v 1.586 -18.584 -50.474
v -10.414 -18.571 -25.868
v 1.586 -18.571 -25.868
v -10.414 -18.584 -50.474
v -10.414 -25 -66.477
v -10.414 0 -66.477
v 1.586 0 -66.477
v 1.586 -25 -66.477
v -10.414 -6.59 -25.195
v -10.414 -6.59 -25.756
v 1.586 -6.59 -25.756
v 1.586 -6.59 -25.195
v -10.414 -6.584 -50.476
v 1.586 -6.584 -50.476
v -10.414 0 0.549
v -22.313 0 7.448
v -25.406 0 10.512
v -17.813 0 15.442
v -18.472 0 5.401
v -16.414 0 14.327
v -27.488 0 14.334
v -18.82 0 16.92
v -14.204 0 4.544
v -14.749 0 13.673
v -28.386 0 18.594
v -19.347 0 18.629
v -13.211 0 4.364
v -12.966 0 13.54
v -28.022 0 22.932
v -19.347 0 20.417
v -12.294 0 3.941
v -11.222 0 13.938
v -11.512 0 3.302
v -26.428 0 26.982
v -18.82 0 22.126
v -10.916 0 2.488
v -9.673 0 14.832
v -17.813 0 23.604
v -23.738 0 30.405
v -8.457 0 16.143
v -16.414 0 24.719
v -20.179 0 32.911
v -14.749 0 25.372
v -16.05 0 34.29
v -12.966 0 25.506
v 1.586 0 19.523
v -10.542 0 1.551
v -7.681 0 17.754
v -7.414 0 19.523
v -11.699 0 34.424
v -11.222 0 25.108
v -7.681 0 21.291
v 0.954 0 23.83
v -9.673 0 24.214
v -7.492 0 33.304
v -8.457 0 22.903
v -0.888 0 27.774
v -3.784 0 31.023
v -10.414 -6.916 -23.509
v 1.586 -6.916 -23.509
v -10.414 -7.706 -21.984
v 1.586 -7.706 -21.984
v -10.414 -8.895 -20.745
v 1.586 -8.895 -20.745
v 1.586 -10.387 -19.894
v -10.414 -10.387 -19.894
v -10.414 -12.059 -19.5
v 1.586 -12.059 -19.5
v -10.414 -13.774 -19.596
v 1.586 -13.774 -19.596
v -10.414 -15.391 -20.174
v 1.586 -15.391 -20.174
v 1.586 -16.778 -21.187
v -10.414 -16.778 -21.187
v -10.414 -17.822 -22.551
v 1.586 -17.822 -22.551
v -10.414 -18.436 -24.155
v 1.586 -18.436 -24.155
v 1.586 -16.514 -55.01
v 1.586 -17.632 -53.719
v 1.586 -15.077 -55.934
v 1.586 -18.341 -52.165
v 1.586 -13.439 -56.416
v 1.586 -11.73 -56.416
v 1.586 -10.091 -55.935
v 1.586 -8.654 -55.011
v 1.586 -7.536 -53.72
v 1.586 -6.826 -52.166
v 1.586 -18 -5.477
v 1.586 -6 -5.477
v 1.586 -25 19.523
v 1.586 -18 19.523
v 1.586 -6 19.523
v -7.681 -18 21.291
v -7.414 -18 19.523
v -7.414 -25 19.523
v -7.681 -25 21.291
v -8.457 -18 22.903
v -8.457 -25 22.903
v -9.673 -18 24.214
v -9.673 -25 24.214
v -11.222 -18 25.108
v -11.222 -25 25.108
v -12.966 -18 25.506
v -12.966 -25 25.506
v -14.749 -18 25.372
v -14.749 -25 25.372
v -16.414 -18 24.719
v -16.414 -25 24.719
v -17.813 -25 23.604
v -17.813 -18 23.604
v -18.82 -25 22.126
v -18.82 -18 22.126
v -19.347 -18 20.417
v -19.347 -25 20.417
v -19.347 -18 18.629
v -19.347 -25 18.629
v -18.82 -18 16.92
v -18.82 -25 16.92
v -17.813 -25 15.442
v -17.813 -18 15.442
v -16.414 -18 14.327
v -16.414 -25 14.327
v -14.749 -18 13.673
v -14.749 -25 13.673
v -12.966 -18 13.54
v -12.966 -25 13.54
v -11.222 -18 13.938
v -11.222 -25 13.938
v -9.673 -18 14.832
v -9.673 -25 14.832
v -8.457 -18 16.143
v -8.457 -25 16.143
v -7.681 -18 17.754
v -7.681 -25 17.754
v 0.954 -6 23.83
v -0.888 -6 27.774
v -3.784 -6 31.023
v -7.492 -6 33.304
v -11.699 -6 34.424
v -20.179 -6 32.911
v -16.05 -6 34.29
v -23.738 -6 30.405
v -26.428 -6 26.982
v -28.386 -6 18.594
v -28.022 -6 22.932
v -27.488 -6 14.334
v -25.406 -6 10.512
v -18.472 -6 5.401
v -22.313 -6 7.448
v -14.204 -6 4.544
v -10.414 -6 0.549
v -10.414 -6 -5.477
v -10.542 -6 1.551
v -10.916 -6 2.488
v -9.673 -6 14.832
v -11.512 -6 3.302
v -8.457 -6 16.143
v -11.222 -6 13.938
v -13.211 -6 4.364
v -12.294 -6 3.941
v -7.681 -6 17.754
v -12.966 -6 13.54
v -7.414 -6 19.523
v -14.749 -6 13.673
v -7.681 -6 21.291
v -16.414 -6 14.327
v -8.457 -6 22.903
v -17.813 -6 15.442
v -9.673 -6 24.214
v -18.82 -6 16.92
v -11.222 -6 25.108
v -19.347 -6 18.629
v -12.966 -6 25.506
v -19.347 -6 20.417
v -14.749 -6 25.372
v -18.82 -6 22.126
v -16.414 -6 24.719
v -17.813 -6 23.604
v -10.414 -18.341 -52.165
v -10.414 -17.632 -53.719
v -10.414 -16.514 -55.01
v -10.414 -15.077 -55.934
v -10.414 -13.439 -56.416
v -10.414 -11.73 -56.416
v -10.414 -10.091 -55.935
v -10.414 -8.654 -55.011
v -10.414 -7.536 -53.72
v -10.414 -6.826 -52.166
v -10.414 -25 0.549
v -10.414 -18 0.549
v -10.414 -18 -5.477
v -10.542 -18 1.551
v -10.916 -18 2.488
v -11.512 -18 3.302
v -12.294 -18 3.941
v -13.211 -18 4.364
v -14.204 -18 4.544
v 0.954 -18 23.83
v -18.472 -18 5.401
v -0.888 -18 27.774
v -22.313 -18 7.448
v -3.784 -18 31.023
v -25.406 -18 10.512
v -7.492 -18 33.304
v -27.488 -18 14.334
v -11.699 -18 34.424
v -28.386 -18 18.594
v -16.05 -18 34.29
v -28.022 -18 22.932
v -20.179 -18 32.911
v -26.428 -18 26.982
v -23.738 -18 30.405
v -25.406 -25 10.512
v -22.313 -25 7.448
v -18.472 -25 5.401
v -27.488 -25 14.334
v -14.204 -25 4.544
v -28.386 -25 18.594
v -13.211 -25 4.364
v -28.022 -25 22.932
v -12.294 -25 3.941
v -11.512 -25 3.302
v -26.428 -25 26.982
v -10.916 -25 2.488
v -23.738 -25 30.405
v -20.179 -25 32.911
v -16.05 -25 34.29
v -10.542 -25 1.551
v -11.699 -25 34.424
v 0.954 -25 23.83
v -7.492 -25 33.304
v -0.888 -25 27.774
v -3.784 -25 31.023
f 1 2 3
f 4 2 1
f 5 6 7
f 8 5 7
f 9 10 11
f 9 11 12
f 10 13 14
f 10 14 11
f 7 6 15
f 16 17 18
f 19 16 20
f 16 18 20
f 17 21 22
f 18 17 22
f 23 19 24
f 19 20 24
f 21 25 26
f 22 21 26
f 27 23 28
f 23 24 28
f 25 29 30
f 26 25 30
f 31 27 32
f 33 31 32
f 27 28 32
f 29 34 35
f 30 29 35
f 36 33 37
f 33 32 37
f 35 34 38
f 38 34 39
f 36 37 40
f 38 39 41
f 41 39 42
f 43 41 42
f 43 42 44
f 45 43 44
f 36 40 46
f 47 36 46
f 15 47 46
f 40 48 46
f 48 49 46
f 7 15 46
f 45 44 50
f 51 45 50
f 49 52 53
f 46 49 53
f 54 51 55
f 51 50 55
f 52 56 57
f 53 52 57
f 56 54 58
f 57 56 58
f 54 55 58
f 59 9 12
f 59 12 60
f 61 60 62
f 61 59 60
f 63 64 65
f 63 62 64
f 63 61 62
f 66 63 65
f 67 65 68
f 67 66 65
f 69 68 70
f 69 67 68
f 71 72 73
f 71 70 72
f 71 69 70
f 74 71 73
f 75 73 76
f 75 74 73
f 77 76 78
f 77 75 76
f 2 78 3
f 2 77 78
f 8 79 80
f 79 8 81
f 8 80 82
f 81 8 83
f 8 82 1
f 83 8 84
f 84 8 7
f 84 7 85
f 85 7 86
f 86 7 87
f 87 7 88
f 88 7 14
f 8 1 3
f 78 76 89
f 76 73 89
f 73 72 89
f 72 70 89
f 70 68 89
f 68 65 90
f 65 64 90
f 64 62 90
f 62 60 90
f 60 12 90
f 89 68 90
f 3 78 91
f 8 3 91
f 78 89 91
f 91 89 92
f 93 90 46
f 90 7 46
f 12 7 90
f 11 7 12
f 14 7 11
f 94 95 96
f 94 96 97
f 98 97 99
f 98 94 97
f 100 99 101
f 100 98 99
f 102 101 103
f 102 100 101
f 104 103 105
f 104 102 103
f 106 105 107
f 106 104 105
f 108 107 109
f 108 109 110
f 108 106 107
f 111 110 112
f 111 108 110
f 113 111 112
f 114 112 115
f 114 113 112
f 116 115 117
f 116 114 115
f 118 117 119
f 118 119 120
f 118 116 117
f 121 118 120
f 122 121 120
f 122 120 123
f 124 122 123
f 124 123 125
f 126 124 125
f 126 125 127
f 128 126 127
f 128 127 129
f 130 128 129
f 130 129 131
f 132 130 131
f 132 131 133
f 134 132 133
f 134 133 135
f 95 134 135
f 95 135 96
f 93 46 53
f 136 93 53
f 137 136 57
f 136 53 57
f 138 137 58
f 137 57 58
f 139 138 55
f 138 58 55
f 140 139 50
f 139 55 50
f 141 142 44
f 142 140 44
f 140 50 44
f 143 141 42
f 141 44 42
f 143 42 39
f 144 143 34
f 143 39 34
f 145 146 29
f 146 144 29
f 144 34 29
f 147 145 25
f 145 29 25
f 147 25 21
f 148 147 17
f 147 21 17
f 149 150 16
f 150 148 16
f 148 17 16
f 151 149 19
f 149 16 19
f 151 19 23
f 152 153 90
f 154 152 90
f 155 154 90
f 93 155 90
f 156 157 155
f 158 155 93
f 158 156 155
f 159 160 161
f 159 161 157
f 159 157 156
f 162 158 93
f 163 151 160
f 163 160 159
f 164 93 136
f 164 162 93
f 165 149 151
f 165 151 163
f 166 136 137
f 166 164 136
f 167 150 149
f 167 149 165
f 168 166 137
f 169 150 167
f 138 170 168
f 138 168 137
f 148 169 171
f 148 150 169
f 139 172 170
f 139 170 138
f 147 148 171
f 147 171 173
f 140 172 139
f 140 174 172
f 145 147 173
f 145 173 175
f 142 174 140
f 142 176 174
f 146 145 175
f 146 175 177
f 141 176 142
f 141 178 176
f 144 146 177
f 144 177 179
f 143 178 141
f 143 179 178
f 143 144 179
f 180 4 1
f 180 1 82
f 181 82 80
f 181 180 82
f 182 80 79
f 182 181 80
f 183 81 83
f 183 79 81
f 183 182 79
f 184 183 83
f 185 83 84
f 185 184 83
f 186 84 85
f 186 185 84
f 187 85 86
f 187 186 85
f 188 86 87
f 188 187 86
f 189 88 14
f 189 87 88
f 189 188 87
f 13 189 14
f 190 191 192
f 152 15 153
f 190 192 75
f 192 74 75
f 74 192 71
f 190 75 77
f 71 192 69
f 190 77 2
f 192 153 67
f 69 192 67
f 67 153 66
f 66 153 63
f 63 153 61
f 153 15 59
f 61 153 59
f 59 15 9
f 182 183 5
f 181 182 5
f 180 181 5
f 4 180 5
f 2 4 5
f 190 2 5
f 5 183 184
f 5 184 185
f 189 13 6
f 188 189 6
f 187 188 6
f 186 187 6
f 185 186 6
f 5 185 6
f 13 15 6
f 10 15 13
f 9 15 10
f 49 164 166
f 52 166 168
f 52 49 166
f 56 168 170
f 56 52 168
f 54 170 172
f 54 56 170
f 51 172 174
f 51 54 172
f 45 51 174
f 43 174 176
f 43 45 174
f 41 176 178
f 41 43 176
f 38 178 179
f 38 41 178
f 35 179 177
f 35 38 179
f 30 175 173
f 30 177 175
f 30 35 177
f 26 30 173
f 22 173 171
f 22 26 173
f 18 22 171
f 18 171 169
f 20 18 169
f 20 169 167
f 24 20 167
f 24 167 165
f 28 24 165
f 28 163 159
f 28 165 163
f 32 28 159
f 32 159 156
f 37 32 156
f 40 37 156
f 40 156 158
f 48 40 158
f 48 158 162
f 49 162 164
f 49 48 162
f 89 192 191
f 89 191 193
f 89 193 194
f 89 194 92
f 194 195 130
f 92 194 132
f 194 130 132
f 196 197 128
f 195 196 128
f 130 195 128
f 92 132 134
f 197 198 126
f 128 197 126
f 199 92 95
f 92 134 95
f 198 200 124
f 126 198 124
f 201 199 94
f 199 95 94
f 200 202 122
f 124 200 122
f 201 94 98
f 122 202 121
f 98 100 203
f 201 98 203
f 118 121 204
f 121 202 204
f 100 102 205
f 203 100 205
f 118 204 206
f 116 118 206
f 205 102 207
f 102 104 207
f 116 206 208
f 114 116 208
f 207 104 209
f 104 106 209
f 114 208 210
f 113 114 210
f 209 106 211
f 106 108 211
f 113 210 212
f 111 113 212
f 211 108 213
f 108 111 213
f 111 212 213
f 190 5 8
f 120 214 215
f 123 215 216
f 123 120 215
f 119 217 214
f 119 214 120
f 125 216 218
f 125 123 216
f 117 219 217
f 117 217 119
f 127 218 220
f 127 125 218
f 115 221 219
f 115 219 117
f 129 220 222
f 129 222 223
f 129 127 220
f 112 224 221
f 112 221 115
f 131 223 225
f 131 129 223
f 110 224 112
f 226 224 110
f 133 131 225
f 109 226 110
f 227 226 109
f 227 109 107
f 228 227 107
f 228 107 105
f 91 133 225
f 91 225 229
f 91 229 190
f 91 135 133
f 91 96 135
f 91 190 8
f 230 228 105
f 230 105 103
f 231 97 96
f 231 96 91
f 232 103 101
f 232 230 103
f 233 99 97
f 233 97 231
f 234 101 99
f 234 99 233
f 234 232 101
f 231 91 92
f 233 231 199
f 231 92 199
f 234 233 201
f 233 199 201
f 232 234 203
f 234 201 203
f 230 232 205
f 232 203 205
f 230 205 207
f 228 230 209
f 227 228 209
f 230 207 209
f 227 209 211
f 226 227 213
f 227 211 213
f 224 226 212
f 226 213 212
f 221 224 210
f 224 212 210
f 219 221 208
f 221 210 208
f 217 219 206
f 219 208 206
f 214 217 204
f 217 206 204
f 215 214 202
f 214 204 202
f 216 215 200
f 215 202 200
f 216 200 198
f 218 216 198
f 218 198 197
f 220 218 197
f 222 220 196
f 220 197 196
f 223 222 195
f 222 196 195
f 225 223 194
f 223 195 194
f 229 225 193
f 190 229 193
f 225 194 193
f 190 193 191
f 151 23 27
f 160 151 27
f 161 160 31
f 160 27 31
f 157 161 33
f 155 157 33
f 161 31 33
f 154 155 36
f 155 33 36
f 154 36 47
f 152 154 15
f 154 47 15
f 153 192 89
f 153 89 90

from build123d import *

# Parameters (mm, degrees)
F0_R     = 6
F1_DEPTH = 25
F3_W     = 12
F3_H     = 47.911397
F4_DEPTH = 60.286648


with BuildPart() as f1:
    # F0 (on Front) → F1 (new body)
    with BuildSketch(Plane.XZ):
        with BuildLine():
            Line((1.585648, -66.477157), (1.585648, 19.522843))
            ThreePointArc((1.585648, 19.522843), (-23.73806, 30.404987), (-14.203826, 4.543633))
            ThreePointArc((-14.203826, 4.543633), (-11.512447, 3.302166), (-10.414352, 0.549177))
            Line((-10.414352, 0.549177), (-10.414352, -66.477157))
            Line((-10.414352, -66.477157), (1.585648, -66.477157))
        make_face()
        with Locations((-13.414352, 19.522843)):
            Circle(F0_R, mode=Mode.SUBTRACT)
    extrude(amount=F1_DEPTH)

    # F3 (on offset) → F4 (cut, through all)
    with BuildSketch(Plane.YZ.offset(-58.7)):
        with Locations((-12, 18.478541)):
            Rectangle(F3_W, F3_H)
        with BuildLine():
            Line((-6.583733, -50.475587), (-6.590202, -25.755703))
            Line((-6.590202, -25.755703), (-6.590348, -25.195473))
            ThreePointArc((-6.590348, -25.195473), (-12.919821, -19.486577), (-18.571014, -25.867622))
            Line((-18.571014, -25.867622), (-18.583732, -50.474056))
            ThreePointArc((-18.583732, -50.474056), (-12.584498, -56.477157), (-6.583733, -50.475587))
        make_face()
    extrude(amount=F4_DEPTH, mode=Mode.SUBTRACT)


solid = f1.part
